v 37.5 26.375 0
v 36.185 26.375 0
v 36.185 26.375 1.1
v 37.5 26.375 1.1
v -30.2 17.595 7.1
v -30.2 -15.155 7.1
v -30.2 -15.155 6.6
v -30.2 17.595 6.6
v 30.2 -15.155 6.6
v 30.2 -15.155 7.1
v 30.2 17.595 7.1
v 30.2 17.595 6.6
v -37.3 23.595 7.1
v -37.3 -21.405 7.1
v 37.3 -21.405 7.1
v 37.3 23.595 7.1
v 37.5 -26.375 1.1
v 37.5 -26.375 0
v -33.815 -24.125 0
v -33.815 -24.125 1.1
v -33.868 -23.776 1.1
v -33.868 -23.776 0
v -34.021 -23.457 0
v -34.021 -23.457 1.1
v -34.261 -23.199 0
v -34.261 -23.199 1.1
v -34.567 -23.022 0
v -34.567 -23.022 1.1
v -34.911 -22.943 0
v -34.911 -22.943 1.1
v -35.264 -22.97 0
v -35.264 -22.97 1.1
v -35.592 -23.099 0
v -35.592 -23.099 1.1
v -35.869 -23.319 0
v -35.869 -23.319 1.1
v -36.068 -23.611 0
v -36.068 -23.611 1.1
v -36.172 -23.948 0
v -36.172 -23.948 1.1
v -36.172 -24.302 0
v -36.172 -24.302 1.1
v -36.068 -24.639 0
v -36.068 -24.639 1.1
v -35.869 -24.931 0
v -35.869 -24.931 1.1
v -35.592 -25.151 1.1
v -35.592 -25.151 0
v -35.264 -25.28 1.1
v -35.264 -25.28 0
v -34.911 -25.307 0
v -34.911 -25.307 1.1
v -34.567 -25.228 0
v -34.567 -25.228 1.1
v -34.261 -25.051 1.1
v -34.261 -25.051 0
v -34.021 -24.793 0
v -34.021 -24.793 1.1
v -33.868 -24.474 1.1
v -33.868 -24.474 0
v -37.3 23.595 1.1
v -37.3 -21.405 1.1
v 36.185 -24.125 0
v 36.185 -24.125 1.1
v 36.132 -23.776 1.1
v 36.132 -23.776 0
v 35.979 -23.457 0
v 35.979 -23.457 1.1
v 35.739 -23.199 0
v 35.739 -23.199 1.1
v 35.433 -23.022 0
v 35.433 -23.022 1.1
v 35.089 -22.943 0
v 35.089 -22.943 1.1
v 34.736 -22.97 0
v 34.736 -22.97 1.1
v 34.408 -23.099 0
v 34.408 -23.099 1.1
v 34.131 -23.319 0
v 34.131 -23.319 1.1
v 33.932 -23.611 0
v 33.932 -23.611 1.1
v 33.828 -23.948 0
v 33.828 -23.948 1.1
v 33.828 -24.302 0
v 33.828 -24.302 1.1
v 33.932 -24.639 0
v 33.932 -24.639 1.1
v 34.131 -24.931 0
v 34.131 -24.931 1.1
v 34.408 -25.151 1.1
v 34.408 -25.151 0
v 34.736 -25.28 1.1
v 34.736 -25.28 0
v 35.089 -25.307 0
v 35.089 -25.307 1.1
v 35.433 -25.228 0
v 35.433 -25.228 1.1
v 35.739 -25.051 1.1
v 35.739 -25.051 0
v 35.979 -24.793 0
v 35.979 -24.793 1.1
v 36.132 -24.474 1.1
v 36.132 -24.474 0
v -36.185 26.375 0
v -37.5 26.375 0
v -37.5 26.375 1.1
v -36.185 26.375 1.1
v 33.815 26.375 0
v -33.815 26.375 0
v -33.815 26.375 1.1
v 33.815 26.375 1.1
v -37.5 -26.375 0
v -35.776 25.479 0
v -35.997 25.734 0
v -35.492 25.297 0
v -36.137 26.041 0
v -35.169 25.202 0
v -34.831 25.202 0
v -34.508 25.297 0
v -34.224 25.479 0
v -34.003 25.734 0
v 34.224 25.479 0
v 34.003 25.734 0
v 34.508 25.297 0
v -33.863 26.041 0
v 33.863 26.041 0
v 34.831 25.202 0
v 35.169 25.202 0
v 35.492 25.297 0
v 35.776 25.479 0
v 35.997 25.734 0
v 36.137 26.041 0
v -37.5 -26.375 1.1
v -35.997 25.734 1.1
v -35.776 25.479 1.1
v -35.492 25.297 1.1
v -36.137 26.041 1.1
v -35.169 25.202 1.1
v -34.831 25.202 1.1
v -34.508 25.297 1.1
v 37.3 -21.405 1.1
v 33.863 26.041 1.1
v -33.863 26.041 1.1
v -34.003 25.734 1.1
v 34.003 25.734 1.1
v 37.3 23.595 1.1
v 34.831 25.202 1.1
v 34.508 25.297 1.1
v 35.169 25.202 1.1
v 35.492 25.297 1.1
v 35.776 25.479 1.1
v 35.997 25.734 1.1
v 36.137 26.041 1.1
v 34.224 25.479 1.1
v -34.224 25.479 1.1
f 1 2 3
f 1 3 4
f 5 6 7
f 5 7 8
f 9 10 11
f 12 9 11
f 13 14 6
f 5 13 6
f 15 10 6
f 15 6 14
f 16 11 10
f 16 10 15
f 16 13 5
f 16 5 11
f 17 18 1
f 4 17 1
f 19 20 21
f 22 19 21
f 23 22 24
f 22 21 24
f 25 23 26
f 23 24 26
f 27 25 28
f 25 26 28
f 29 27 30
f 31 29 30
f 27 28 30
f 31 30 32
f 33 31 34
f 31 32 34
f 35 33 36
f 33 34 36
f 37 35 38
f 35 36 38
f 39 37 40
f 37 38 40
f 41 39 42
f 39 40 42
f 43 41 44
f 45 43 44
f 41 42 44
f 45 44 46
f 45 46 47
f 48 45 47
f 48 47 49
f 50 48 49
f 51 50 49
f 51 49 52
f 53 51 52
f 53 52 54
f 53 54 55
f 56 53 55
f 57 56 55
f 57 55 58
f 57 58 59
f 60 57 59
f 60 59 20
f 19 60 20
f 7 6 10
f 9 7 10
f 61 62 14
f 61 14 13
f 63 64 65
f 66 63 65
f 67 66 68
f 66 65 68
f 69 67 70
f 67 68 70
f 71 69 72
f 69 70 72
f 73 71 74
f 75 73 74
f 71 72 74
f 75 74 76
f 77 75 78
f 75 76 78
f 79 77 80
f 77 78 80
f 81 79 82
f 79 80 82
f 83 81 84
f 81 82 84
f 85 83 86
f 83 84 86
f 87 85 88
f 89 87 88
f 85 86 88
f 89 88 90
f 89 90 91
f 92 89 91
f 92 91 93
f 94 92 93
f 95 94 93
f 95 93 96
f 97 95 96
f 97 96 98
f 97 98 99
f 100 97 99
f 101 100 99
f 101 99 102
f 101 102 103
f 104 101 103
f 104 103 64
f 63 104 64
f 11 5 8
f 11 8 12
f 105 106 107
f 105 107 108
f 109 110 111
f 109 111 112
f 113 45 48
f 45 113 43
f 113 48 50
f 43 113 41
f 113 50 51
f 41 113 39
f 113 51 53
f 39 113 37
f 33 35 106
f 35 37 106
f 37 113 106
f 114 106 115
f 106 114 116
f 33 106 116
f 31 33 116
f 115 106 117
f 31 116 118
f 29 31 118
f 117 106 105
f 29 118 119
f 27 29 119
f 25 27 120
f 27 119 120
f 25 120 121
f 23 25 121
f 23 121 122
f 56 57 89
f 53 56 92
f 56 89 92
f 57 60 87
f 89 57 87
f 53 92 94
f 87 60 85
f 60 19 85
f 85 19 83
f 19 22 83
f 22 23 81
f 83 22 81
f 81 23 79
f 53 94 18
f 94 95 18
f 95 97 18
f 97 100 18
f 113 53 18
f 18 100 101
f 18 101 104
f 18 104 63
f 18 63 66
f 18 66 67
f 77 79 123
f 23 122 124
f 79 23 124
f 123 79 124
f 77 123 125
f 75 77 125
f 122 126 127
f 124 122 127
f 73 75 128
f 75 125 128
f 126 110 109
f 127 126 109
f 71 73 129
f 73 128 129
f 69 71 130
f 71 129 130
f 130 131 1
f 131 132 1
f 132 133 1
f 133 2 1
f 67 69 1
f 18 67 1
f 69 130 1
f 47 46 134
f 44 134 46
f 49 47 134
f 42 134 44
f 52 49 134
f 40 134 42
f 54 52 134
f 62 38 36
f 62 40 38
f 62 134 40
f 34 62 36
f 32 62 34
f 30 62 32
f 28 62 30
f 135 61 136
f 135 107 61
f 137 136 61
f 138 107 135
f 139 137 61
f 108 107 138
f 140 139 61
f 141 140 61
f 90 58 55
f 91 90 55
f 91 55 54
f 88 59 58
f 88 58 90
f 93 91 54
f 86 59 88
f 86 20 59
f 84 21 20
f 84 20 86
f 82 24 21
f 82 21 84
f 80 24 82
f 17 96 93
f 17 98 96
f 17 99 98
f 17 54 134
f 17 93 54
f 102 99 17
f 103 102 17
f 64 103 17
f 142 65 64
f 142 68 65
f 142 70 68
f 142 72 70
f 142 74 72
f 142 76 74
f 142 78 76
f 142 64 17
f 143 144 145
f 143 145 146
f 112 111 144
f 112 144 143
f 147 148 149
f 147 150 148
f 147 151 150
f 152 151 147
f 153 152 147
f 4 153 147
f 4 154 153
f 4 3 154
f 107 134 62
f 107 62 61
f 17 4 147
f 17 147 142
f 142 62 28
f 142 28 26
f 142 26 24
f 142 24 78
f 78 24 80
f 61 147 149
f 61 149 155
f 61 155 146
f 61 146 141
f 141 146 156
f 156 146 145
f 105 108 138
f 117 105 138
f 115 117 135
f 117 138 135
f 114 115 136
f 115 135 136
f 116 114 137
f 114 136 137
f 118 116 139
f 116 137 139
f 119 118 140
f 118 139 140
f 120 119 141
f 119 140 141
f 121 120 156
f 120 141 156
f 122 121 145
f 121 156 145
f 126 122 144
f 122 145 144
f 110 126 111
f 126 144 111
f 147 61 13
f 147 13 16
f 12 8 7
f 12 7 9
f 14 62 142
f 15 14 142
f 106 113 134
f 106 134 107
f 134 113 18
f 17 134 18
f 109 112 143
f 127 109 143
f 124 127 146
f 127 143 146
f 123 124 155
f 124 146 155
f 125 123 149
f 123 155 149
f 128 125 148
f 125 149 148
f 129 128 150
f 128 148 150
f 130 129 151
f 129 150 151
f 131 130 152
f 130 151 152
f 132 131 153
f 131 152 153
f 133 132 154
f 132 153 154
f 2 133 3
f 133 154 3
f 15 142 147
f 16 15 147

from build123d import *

# Parameters (mm, degrees)
SKETCH1_W           = 75
SKETCH1_H           = 52.75
BOSS_EXTRUDE1_DEPTH = 1.1
SKETCH2_R           = 1.185
CUT_EXTRUDE1_DEPTH  = 46.859575063
SKETCH3_W           = 74.6
SKETCH3_H           = 45
BOSS_EXTRUDE2_DEPTH = 6
SKETCH4_W           = 60.4
SKETCH4_H           = 32.75
CUT_EXTRUDE2_DEPTH  = 0.5


with BuildPart() as part:
    # Sketch1 → Boss-Extrude1 (new body)
    with BuildSketch(Plane.XY):
        Rectangle(SKETCH1_W, SKETCH1_H)
    extrude(amount=BOSS_EXTRUDE1_DEPTH)

    # Sketch2 → Cut-Extrude1 (cut, through all)
    with BuildSketch(Plane.XY.offset(1.1)):
        with Locations((-35, -24.125)):
            Circle(SKETCH2_R)
        with Locations((35, -24.125)):
            Circle(SKETCH2_R)
        with Locations((35, 26.375)):
            Circle(SKETCH2_R)
        with Locations((-35, 26.375)):
            Circle(SKETCH2_R)
    extrude(amount=-CUT_EXTRUDE1_DEPTH, mode=Mode.SUBTRACT)

    # Sketch3 → Boss-Extrude2 (add)
    with BuildSketch(Plane.XY.offset(1.1)):
        with Locations((0, 1.095)):
            Rectangle(SKETCH3_W, SKETCH3_H)
    extrude(amount=BOSS_EXTRUDE2_DEPTH)

    # Sketch4 → Cut-Extrude2 (cut)
    with BuildSketch(Plane.XY.offset(7.1)):
        with Locations((0, 1.22)):
            Rectangle(SKETCH4_W, SKETCH4_H)
    extrude(amount=-CUT_EXTRUDE2_DEPTH, mode=Mode.SUBTRACT)


solid = part.part
